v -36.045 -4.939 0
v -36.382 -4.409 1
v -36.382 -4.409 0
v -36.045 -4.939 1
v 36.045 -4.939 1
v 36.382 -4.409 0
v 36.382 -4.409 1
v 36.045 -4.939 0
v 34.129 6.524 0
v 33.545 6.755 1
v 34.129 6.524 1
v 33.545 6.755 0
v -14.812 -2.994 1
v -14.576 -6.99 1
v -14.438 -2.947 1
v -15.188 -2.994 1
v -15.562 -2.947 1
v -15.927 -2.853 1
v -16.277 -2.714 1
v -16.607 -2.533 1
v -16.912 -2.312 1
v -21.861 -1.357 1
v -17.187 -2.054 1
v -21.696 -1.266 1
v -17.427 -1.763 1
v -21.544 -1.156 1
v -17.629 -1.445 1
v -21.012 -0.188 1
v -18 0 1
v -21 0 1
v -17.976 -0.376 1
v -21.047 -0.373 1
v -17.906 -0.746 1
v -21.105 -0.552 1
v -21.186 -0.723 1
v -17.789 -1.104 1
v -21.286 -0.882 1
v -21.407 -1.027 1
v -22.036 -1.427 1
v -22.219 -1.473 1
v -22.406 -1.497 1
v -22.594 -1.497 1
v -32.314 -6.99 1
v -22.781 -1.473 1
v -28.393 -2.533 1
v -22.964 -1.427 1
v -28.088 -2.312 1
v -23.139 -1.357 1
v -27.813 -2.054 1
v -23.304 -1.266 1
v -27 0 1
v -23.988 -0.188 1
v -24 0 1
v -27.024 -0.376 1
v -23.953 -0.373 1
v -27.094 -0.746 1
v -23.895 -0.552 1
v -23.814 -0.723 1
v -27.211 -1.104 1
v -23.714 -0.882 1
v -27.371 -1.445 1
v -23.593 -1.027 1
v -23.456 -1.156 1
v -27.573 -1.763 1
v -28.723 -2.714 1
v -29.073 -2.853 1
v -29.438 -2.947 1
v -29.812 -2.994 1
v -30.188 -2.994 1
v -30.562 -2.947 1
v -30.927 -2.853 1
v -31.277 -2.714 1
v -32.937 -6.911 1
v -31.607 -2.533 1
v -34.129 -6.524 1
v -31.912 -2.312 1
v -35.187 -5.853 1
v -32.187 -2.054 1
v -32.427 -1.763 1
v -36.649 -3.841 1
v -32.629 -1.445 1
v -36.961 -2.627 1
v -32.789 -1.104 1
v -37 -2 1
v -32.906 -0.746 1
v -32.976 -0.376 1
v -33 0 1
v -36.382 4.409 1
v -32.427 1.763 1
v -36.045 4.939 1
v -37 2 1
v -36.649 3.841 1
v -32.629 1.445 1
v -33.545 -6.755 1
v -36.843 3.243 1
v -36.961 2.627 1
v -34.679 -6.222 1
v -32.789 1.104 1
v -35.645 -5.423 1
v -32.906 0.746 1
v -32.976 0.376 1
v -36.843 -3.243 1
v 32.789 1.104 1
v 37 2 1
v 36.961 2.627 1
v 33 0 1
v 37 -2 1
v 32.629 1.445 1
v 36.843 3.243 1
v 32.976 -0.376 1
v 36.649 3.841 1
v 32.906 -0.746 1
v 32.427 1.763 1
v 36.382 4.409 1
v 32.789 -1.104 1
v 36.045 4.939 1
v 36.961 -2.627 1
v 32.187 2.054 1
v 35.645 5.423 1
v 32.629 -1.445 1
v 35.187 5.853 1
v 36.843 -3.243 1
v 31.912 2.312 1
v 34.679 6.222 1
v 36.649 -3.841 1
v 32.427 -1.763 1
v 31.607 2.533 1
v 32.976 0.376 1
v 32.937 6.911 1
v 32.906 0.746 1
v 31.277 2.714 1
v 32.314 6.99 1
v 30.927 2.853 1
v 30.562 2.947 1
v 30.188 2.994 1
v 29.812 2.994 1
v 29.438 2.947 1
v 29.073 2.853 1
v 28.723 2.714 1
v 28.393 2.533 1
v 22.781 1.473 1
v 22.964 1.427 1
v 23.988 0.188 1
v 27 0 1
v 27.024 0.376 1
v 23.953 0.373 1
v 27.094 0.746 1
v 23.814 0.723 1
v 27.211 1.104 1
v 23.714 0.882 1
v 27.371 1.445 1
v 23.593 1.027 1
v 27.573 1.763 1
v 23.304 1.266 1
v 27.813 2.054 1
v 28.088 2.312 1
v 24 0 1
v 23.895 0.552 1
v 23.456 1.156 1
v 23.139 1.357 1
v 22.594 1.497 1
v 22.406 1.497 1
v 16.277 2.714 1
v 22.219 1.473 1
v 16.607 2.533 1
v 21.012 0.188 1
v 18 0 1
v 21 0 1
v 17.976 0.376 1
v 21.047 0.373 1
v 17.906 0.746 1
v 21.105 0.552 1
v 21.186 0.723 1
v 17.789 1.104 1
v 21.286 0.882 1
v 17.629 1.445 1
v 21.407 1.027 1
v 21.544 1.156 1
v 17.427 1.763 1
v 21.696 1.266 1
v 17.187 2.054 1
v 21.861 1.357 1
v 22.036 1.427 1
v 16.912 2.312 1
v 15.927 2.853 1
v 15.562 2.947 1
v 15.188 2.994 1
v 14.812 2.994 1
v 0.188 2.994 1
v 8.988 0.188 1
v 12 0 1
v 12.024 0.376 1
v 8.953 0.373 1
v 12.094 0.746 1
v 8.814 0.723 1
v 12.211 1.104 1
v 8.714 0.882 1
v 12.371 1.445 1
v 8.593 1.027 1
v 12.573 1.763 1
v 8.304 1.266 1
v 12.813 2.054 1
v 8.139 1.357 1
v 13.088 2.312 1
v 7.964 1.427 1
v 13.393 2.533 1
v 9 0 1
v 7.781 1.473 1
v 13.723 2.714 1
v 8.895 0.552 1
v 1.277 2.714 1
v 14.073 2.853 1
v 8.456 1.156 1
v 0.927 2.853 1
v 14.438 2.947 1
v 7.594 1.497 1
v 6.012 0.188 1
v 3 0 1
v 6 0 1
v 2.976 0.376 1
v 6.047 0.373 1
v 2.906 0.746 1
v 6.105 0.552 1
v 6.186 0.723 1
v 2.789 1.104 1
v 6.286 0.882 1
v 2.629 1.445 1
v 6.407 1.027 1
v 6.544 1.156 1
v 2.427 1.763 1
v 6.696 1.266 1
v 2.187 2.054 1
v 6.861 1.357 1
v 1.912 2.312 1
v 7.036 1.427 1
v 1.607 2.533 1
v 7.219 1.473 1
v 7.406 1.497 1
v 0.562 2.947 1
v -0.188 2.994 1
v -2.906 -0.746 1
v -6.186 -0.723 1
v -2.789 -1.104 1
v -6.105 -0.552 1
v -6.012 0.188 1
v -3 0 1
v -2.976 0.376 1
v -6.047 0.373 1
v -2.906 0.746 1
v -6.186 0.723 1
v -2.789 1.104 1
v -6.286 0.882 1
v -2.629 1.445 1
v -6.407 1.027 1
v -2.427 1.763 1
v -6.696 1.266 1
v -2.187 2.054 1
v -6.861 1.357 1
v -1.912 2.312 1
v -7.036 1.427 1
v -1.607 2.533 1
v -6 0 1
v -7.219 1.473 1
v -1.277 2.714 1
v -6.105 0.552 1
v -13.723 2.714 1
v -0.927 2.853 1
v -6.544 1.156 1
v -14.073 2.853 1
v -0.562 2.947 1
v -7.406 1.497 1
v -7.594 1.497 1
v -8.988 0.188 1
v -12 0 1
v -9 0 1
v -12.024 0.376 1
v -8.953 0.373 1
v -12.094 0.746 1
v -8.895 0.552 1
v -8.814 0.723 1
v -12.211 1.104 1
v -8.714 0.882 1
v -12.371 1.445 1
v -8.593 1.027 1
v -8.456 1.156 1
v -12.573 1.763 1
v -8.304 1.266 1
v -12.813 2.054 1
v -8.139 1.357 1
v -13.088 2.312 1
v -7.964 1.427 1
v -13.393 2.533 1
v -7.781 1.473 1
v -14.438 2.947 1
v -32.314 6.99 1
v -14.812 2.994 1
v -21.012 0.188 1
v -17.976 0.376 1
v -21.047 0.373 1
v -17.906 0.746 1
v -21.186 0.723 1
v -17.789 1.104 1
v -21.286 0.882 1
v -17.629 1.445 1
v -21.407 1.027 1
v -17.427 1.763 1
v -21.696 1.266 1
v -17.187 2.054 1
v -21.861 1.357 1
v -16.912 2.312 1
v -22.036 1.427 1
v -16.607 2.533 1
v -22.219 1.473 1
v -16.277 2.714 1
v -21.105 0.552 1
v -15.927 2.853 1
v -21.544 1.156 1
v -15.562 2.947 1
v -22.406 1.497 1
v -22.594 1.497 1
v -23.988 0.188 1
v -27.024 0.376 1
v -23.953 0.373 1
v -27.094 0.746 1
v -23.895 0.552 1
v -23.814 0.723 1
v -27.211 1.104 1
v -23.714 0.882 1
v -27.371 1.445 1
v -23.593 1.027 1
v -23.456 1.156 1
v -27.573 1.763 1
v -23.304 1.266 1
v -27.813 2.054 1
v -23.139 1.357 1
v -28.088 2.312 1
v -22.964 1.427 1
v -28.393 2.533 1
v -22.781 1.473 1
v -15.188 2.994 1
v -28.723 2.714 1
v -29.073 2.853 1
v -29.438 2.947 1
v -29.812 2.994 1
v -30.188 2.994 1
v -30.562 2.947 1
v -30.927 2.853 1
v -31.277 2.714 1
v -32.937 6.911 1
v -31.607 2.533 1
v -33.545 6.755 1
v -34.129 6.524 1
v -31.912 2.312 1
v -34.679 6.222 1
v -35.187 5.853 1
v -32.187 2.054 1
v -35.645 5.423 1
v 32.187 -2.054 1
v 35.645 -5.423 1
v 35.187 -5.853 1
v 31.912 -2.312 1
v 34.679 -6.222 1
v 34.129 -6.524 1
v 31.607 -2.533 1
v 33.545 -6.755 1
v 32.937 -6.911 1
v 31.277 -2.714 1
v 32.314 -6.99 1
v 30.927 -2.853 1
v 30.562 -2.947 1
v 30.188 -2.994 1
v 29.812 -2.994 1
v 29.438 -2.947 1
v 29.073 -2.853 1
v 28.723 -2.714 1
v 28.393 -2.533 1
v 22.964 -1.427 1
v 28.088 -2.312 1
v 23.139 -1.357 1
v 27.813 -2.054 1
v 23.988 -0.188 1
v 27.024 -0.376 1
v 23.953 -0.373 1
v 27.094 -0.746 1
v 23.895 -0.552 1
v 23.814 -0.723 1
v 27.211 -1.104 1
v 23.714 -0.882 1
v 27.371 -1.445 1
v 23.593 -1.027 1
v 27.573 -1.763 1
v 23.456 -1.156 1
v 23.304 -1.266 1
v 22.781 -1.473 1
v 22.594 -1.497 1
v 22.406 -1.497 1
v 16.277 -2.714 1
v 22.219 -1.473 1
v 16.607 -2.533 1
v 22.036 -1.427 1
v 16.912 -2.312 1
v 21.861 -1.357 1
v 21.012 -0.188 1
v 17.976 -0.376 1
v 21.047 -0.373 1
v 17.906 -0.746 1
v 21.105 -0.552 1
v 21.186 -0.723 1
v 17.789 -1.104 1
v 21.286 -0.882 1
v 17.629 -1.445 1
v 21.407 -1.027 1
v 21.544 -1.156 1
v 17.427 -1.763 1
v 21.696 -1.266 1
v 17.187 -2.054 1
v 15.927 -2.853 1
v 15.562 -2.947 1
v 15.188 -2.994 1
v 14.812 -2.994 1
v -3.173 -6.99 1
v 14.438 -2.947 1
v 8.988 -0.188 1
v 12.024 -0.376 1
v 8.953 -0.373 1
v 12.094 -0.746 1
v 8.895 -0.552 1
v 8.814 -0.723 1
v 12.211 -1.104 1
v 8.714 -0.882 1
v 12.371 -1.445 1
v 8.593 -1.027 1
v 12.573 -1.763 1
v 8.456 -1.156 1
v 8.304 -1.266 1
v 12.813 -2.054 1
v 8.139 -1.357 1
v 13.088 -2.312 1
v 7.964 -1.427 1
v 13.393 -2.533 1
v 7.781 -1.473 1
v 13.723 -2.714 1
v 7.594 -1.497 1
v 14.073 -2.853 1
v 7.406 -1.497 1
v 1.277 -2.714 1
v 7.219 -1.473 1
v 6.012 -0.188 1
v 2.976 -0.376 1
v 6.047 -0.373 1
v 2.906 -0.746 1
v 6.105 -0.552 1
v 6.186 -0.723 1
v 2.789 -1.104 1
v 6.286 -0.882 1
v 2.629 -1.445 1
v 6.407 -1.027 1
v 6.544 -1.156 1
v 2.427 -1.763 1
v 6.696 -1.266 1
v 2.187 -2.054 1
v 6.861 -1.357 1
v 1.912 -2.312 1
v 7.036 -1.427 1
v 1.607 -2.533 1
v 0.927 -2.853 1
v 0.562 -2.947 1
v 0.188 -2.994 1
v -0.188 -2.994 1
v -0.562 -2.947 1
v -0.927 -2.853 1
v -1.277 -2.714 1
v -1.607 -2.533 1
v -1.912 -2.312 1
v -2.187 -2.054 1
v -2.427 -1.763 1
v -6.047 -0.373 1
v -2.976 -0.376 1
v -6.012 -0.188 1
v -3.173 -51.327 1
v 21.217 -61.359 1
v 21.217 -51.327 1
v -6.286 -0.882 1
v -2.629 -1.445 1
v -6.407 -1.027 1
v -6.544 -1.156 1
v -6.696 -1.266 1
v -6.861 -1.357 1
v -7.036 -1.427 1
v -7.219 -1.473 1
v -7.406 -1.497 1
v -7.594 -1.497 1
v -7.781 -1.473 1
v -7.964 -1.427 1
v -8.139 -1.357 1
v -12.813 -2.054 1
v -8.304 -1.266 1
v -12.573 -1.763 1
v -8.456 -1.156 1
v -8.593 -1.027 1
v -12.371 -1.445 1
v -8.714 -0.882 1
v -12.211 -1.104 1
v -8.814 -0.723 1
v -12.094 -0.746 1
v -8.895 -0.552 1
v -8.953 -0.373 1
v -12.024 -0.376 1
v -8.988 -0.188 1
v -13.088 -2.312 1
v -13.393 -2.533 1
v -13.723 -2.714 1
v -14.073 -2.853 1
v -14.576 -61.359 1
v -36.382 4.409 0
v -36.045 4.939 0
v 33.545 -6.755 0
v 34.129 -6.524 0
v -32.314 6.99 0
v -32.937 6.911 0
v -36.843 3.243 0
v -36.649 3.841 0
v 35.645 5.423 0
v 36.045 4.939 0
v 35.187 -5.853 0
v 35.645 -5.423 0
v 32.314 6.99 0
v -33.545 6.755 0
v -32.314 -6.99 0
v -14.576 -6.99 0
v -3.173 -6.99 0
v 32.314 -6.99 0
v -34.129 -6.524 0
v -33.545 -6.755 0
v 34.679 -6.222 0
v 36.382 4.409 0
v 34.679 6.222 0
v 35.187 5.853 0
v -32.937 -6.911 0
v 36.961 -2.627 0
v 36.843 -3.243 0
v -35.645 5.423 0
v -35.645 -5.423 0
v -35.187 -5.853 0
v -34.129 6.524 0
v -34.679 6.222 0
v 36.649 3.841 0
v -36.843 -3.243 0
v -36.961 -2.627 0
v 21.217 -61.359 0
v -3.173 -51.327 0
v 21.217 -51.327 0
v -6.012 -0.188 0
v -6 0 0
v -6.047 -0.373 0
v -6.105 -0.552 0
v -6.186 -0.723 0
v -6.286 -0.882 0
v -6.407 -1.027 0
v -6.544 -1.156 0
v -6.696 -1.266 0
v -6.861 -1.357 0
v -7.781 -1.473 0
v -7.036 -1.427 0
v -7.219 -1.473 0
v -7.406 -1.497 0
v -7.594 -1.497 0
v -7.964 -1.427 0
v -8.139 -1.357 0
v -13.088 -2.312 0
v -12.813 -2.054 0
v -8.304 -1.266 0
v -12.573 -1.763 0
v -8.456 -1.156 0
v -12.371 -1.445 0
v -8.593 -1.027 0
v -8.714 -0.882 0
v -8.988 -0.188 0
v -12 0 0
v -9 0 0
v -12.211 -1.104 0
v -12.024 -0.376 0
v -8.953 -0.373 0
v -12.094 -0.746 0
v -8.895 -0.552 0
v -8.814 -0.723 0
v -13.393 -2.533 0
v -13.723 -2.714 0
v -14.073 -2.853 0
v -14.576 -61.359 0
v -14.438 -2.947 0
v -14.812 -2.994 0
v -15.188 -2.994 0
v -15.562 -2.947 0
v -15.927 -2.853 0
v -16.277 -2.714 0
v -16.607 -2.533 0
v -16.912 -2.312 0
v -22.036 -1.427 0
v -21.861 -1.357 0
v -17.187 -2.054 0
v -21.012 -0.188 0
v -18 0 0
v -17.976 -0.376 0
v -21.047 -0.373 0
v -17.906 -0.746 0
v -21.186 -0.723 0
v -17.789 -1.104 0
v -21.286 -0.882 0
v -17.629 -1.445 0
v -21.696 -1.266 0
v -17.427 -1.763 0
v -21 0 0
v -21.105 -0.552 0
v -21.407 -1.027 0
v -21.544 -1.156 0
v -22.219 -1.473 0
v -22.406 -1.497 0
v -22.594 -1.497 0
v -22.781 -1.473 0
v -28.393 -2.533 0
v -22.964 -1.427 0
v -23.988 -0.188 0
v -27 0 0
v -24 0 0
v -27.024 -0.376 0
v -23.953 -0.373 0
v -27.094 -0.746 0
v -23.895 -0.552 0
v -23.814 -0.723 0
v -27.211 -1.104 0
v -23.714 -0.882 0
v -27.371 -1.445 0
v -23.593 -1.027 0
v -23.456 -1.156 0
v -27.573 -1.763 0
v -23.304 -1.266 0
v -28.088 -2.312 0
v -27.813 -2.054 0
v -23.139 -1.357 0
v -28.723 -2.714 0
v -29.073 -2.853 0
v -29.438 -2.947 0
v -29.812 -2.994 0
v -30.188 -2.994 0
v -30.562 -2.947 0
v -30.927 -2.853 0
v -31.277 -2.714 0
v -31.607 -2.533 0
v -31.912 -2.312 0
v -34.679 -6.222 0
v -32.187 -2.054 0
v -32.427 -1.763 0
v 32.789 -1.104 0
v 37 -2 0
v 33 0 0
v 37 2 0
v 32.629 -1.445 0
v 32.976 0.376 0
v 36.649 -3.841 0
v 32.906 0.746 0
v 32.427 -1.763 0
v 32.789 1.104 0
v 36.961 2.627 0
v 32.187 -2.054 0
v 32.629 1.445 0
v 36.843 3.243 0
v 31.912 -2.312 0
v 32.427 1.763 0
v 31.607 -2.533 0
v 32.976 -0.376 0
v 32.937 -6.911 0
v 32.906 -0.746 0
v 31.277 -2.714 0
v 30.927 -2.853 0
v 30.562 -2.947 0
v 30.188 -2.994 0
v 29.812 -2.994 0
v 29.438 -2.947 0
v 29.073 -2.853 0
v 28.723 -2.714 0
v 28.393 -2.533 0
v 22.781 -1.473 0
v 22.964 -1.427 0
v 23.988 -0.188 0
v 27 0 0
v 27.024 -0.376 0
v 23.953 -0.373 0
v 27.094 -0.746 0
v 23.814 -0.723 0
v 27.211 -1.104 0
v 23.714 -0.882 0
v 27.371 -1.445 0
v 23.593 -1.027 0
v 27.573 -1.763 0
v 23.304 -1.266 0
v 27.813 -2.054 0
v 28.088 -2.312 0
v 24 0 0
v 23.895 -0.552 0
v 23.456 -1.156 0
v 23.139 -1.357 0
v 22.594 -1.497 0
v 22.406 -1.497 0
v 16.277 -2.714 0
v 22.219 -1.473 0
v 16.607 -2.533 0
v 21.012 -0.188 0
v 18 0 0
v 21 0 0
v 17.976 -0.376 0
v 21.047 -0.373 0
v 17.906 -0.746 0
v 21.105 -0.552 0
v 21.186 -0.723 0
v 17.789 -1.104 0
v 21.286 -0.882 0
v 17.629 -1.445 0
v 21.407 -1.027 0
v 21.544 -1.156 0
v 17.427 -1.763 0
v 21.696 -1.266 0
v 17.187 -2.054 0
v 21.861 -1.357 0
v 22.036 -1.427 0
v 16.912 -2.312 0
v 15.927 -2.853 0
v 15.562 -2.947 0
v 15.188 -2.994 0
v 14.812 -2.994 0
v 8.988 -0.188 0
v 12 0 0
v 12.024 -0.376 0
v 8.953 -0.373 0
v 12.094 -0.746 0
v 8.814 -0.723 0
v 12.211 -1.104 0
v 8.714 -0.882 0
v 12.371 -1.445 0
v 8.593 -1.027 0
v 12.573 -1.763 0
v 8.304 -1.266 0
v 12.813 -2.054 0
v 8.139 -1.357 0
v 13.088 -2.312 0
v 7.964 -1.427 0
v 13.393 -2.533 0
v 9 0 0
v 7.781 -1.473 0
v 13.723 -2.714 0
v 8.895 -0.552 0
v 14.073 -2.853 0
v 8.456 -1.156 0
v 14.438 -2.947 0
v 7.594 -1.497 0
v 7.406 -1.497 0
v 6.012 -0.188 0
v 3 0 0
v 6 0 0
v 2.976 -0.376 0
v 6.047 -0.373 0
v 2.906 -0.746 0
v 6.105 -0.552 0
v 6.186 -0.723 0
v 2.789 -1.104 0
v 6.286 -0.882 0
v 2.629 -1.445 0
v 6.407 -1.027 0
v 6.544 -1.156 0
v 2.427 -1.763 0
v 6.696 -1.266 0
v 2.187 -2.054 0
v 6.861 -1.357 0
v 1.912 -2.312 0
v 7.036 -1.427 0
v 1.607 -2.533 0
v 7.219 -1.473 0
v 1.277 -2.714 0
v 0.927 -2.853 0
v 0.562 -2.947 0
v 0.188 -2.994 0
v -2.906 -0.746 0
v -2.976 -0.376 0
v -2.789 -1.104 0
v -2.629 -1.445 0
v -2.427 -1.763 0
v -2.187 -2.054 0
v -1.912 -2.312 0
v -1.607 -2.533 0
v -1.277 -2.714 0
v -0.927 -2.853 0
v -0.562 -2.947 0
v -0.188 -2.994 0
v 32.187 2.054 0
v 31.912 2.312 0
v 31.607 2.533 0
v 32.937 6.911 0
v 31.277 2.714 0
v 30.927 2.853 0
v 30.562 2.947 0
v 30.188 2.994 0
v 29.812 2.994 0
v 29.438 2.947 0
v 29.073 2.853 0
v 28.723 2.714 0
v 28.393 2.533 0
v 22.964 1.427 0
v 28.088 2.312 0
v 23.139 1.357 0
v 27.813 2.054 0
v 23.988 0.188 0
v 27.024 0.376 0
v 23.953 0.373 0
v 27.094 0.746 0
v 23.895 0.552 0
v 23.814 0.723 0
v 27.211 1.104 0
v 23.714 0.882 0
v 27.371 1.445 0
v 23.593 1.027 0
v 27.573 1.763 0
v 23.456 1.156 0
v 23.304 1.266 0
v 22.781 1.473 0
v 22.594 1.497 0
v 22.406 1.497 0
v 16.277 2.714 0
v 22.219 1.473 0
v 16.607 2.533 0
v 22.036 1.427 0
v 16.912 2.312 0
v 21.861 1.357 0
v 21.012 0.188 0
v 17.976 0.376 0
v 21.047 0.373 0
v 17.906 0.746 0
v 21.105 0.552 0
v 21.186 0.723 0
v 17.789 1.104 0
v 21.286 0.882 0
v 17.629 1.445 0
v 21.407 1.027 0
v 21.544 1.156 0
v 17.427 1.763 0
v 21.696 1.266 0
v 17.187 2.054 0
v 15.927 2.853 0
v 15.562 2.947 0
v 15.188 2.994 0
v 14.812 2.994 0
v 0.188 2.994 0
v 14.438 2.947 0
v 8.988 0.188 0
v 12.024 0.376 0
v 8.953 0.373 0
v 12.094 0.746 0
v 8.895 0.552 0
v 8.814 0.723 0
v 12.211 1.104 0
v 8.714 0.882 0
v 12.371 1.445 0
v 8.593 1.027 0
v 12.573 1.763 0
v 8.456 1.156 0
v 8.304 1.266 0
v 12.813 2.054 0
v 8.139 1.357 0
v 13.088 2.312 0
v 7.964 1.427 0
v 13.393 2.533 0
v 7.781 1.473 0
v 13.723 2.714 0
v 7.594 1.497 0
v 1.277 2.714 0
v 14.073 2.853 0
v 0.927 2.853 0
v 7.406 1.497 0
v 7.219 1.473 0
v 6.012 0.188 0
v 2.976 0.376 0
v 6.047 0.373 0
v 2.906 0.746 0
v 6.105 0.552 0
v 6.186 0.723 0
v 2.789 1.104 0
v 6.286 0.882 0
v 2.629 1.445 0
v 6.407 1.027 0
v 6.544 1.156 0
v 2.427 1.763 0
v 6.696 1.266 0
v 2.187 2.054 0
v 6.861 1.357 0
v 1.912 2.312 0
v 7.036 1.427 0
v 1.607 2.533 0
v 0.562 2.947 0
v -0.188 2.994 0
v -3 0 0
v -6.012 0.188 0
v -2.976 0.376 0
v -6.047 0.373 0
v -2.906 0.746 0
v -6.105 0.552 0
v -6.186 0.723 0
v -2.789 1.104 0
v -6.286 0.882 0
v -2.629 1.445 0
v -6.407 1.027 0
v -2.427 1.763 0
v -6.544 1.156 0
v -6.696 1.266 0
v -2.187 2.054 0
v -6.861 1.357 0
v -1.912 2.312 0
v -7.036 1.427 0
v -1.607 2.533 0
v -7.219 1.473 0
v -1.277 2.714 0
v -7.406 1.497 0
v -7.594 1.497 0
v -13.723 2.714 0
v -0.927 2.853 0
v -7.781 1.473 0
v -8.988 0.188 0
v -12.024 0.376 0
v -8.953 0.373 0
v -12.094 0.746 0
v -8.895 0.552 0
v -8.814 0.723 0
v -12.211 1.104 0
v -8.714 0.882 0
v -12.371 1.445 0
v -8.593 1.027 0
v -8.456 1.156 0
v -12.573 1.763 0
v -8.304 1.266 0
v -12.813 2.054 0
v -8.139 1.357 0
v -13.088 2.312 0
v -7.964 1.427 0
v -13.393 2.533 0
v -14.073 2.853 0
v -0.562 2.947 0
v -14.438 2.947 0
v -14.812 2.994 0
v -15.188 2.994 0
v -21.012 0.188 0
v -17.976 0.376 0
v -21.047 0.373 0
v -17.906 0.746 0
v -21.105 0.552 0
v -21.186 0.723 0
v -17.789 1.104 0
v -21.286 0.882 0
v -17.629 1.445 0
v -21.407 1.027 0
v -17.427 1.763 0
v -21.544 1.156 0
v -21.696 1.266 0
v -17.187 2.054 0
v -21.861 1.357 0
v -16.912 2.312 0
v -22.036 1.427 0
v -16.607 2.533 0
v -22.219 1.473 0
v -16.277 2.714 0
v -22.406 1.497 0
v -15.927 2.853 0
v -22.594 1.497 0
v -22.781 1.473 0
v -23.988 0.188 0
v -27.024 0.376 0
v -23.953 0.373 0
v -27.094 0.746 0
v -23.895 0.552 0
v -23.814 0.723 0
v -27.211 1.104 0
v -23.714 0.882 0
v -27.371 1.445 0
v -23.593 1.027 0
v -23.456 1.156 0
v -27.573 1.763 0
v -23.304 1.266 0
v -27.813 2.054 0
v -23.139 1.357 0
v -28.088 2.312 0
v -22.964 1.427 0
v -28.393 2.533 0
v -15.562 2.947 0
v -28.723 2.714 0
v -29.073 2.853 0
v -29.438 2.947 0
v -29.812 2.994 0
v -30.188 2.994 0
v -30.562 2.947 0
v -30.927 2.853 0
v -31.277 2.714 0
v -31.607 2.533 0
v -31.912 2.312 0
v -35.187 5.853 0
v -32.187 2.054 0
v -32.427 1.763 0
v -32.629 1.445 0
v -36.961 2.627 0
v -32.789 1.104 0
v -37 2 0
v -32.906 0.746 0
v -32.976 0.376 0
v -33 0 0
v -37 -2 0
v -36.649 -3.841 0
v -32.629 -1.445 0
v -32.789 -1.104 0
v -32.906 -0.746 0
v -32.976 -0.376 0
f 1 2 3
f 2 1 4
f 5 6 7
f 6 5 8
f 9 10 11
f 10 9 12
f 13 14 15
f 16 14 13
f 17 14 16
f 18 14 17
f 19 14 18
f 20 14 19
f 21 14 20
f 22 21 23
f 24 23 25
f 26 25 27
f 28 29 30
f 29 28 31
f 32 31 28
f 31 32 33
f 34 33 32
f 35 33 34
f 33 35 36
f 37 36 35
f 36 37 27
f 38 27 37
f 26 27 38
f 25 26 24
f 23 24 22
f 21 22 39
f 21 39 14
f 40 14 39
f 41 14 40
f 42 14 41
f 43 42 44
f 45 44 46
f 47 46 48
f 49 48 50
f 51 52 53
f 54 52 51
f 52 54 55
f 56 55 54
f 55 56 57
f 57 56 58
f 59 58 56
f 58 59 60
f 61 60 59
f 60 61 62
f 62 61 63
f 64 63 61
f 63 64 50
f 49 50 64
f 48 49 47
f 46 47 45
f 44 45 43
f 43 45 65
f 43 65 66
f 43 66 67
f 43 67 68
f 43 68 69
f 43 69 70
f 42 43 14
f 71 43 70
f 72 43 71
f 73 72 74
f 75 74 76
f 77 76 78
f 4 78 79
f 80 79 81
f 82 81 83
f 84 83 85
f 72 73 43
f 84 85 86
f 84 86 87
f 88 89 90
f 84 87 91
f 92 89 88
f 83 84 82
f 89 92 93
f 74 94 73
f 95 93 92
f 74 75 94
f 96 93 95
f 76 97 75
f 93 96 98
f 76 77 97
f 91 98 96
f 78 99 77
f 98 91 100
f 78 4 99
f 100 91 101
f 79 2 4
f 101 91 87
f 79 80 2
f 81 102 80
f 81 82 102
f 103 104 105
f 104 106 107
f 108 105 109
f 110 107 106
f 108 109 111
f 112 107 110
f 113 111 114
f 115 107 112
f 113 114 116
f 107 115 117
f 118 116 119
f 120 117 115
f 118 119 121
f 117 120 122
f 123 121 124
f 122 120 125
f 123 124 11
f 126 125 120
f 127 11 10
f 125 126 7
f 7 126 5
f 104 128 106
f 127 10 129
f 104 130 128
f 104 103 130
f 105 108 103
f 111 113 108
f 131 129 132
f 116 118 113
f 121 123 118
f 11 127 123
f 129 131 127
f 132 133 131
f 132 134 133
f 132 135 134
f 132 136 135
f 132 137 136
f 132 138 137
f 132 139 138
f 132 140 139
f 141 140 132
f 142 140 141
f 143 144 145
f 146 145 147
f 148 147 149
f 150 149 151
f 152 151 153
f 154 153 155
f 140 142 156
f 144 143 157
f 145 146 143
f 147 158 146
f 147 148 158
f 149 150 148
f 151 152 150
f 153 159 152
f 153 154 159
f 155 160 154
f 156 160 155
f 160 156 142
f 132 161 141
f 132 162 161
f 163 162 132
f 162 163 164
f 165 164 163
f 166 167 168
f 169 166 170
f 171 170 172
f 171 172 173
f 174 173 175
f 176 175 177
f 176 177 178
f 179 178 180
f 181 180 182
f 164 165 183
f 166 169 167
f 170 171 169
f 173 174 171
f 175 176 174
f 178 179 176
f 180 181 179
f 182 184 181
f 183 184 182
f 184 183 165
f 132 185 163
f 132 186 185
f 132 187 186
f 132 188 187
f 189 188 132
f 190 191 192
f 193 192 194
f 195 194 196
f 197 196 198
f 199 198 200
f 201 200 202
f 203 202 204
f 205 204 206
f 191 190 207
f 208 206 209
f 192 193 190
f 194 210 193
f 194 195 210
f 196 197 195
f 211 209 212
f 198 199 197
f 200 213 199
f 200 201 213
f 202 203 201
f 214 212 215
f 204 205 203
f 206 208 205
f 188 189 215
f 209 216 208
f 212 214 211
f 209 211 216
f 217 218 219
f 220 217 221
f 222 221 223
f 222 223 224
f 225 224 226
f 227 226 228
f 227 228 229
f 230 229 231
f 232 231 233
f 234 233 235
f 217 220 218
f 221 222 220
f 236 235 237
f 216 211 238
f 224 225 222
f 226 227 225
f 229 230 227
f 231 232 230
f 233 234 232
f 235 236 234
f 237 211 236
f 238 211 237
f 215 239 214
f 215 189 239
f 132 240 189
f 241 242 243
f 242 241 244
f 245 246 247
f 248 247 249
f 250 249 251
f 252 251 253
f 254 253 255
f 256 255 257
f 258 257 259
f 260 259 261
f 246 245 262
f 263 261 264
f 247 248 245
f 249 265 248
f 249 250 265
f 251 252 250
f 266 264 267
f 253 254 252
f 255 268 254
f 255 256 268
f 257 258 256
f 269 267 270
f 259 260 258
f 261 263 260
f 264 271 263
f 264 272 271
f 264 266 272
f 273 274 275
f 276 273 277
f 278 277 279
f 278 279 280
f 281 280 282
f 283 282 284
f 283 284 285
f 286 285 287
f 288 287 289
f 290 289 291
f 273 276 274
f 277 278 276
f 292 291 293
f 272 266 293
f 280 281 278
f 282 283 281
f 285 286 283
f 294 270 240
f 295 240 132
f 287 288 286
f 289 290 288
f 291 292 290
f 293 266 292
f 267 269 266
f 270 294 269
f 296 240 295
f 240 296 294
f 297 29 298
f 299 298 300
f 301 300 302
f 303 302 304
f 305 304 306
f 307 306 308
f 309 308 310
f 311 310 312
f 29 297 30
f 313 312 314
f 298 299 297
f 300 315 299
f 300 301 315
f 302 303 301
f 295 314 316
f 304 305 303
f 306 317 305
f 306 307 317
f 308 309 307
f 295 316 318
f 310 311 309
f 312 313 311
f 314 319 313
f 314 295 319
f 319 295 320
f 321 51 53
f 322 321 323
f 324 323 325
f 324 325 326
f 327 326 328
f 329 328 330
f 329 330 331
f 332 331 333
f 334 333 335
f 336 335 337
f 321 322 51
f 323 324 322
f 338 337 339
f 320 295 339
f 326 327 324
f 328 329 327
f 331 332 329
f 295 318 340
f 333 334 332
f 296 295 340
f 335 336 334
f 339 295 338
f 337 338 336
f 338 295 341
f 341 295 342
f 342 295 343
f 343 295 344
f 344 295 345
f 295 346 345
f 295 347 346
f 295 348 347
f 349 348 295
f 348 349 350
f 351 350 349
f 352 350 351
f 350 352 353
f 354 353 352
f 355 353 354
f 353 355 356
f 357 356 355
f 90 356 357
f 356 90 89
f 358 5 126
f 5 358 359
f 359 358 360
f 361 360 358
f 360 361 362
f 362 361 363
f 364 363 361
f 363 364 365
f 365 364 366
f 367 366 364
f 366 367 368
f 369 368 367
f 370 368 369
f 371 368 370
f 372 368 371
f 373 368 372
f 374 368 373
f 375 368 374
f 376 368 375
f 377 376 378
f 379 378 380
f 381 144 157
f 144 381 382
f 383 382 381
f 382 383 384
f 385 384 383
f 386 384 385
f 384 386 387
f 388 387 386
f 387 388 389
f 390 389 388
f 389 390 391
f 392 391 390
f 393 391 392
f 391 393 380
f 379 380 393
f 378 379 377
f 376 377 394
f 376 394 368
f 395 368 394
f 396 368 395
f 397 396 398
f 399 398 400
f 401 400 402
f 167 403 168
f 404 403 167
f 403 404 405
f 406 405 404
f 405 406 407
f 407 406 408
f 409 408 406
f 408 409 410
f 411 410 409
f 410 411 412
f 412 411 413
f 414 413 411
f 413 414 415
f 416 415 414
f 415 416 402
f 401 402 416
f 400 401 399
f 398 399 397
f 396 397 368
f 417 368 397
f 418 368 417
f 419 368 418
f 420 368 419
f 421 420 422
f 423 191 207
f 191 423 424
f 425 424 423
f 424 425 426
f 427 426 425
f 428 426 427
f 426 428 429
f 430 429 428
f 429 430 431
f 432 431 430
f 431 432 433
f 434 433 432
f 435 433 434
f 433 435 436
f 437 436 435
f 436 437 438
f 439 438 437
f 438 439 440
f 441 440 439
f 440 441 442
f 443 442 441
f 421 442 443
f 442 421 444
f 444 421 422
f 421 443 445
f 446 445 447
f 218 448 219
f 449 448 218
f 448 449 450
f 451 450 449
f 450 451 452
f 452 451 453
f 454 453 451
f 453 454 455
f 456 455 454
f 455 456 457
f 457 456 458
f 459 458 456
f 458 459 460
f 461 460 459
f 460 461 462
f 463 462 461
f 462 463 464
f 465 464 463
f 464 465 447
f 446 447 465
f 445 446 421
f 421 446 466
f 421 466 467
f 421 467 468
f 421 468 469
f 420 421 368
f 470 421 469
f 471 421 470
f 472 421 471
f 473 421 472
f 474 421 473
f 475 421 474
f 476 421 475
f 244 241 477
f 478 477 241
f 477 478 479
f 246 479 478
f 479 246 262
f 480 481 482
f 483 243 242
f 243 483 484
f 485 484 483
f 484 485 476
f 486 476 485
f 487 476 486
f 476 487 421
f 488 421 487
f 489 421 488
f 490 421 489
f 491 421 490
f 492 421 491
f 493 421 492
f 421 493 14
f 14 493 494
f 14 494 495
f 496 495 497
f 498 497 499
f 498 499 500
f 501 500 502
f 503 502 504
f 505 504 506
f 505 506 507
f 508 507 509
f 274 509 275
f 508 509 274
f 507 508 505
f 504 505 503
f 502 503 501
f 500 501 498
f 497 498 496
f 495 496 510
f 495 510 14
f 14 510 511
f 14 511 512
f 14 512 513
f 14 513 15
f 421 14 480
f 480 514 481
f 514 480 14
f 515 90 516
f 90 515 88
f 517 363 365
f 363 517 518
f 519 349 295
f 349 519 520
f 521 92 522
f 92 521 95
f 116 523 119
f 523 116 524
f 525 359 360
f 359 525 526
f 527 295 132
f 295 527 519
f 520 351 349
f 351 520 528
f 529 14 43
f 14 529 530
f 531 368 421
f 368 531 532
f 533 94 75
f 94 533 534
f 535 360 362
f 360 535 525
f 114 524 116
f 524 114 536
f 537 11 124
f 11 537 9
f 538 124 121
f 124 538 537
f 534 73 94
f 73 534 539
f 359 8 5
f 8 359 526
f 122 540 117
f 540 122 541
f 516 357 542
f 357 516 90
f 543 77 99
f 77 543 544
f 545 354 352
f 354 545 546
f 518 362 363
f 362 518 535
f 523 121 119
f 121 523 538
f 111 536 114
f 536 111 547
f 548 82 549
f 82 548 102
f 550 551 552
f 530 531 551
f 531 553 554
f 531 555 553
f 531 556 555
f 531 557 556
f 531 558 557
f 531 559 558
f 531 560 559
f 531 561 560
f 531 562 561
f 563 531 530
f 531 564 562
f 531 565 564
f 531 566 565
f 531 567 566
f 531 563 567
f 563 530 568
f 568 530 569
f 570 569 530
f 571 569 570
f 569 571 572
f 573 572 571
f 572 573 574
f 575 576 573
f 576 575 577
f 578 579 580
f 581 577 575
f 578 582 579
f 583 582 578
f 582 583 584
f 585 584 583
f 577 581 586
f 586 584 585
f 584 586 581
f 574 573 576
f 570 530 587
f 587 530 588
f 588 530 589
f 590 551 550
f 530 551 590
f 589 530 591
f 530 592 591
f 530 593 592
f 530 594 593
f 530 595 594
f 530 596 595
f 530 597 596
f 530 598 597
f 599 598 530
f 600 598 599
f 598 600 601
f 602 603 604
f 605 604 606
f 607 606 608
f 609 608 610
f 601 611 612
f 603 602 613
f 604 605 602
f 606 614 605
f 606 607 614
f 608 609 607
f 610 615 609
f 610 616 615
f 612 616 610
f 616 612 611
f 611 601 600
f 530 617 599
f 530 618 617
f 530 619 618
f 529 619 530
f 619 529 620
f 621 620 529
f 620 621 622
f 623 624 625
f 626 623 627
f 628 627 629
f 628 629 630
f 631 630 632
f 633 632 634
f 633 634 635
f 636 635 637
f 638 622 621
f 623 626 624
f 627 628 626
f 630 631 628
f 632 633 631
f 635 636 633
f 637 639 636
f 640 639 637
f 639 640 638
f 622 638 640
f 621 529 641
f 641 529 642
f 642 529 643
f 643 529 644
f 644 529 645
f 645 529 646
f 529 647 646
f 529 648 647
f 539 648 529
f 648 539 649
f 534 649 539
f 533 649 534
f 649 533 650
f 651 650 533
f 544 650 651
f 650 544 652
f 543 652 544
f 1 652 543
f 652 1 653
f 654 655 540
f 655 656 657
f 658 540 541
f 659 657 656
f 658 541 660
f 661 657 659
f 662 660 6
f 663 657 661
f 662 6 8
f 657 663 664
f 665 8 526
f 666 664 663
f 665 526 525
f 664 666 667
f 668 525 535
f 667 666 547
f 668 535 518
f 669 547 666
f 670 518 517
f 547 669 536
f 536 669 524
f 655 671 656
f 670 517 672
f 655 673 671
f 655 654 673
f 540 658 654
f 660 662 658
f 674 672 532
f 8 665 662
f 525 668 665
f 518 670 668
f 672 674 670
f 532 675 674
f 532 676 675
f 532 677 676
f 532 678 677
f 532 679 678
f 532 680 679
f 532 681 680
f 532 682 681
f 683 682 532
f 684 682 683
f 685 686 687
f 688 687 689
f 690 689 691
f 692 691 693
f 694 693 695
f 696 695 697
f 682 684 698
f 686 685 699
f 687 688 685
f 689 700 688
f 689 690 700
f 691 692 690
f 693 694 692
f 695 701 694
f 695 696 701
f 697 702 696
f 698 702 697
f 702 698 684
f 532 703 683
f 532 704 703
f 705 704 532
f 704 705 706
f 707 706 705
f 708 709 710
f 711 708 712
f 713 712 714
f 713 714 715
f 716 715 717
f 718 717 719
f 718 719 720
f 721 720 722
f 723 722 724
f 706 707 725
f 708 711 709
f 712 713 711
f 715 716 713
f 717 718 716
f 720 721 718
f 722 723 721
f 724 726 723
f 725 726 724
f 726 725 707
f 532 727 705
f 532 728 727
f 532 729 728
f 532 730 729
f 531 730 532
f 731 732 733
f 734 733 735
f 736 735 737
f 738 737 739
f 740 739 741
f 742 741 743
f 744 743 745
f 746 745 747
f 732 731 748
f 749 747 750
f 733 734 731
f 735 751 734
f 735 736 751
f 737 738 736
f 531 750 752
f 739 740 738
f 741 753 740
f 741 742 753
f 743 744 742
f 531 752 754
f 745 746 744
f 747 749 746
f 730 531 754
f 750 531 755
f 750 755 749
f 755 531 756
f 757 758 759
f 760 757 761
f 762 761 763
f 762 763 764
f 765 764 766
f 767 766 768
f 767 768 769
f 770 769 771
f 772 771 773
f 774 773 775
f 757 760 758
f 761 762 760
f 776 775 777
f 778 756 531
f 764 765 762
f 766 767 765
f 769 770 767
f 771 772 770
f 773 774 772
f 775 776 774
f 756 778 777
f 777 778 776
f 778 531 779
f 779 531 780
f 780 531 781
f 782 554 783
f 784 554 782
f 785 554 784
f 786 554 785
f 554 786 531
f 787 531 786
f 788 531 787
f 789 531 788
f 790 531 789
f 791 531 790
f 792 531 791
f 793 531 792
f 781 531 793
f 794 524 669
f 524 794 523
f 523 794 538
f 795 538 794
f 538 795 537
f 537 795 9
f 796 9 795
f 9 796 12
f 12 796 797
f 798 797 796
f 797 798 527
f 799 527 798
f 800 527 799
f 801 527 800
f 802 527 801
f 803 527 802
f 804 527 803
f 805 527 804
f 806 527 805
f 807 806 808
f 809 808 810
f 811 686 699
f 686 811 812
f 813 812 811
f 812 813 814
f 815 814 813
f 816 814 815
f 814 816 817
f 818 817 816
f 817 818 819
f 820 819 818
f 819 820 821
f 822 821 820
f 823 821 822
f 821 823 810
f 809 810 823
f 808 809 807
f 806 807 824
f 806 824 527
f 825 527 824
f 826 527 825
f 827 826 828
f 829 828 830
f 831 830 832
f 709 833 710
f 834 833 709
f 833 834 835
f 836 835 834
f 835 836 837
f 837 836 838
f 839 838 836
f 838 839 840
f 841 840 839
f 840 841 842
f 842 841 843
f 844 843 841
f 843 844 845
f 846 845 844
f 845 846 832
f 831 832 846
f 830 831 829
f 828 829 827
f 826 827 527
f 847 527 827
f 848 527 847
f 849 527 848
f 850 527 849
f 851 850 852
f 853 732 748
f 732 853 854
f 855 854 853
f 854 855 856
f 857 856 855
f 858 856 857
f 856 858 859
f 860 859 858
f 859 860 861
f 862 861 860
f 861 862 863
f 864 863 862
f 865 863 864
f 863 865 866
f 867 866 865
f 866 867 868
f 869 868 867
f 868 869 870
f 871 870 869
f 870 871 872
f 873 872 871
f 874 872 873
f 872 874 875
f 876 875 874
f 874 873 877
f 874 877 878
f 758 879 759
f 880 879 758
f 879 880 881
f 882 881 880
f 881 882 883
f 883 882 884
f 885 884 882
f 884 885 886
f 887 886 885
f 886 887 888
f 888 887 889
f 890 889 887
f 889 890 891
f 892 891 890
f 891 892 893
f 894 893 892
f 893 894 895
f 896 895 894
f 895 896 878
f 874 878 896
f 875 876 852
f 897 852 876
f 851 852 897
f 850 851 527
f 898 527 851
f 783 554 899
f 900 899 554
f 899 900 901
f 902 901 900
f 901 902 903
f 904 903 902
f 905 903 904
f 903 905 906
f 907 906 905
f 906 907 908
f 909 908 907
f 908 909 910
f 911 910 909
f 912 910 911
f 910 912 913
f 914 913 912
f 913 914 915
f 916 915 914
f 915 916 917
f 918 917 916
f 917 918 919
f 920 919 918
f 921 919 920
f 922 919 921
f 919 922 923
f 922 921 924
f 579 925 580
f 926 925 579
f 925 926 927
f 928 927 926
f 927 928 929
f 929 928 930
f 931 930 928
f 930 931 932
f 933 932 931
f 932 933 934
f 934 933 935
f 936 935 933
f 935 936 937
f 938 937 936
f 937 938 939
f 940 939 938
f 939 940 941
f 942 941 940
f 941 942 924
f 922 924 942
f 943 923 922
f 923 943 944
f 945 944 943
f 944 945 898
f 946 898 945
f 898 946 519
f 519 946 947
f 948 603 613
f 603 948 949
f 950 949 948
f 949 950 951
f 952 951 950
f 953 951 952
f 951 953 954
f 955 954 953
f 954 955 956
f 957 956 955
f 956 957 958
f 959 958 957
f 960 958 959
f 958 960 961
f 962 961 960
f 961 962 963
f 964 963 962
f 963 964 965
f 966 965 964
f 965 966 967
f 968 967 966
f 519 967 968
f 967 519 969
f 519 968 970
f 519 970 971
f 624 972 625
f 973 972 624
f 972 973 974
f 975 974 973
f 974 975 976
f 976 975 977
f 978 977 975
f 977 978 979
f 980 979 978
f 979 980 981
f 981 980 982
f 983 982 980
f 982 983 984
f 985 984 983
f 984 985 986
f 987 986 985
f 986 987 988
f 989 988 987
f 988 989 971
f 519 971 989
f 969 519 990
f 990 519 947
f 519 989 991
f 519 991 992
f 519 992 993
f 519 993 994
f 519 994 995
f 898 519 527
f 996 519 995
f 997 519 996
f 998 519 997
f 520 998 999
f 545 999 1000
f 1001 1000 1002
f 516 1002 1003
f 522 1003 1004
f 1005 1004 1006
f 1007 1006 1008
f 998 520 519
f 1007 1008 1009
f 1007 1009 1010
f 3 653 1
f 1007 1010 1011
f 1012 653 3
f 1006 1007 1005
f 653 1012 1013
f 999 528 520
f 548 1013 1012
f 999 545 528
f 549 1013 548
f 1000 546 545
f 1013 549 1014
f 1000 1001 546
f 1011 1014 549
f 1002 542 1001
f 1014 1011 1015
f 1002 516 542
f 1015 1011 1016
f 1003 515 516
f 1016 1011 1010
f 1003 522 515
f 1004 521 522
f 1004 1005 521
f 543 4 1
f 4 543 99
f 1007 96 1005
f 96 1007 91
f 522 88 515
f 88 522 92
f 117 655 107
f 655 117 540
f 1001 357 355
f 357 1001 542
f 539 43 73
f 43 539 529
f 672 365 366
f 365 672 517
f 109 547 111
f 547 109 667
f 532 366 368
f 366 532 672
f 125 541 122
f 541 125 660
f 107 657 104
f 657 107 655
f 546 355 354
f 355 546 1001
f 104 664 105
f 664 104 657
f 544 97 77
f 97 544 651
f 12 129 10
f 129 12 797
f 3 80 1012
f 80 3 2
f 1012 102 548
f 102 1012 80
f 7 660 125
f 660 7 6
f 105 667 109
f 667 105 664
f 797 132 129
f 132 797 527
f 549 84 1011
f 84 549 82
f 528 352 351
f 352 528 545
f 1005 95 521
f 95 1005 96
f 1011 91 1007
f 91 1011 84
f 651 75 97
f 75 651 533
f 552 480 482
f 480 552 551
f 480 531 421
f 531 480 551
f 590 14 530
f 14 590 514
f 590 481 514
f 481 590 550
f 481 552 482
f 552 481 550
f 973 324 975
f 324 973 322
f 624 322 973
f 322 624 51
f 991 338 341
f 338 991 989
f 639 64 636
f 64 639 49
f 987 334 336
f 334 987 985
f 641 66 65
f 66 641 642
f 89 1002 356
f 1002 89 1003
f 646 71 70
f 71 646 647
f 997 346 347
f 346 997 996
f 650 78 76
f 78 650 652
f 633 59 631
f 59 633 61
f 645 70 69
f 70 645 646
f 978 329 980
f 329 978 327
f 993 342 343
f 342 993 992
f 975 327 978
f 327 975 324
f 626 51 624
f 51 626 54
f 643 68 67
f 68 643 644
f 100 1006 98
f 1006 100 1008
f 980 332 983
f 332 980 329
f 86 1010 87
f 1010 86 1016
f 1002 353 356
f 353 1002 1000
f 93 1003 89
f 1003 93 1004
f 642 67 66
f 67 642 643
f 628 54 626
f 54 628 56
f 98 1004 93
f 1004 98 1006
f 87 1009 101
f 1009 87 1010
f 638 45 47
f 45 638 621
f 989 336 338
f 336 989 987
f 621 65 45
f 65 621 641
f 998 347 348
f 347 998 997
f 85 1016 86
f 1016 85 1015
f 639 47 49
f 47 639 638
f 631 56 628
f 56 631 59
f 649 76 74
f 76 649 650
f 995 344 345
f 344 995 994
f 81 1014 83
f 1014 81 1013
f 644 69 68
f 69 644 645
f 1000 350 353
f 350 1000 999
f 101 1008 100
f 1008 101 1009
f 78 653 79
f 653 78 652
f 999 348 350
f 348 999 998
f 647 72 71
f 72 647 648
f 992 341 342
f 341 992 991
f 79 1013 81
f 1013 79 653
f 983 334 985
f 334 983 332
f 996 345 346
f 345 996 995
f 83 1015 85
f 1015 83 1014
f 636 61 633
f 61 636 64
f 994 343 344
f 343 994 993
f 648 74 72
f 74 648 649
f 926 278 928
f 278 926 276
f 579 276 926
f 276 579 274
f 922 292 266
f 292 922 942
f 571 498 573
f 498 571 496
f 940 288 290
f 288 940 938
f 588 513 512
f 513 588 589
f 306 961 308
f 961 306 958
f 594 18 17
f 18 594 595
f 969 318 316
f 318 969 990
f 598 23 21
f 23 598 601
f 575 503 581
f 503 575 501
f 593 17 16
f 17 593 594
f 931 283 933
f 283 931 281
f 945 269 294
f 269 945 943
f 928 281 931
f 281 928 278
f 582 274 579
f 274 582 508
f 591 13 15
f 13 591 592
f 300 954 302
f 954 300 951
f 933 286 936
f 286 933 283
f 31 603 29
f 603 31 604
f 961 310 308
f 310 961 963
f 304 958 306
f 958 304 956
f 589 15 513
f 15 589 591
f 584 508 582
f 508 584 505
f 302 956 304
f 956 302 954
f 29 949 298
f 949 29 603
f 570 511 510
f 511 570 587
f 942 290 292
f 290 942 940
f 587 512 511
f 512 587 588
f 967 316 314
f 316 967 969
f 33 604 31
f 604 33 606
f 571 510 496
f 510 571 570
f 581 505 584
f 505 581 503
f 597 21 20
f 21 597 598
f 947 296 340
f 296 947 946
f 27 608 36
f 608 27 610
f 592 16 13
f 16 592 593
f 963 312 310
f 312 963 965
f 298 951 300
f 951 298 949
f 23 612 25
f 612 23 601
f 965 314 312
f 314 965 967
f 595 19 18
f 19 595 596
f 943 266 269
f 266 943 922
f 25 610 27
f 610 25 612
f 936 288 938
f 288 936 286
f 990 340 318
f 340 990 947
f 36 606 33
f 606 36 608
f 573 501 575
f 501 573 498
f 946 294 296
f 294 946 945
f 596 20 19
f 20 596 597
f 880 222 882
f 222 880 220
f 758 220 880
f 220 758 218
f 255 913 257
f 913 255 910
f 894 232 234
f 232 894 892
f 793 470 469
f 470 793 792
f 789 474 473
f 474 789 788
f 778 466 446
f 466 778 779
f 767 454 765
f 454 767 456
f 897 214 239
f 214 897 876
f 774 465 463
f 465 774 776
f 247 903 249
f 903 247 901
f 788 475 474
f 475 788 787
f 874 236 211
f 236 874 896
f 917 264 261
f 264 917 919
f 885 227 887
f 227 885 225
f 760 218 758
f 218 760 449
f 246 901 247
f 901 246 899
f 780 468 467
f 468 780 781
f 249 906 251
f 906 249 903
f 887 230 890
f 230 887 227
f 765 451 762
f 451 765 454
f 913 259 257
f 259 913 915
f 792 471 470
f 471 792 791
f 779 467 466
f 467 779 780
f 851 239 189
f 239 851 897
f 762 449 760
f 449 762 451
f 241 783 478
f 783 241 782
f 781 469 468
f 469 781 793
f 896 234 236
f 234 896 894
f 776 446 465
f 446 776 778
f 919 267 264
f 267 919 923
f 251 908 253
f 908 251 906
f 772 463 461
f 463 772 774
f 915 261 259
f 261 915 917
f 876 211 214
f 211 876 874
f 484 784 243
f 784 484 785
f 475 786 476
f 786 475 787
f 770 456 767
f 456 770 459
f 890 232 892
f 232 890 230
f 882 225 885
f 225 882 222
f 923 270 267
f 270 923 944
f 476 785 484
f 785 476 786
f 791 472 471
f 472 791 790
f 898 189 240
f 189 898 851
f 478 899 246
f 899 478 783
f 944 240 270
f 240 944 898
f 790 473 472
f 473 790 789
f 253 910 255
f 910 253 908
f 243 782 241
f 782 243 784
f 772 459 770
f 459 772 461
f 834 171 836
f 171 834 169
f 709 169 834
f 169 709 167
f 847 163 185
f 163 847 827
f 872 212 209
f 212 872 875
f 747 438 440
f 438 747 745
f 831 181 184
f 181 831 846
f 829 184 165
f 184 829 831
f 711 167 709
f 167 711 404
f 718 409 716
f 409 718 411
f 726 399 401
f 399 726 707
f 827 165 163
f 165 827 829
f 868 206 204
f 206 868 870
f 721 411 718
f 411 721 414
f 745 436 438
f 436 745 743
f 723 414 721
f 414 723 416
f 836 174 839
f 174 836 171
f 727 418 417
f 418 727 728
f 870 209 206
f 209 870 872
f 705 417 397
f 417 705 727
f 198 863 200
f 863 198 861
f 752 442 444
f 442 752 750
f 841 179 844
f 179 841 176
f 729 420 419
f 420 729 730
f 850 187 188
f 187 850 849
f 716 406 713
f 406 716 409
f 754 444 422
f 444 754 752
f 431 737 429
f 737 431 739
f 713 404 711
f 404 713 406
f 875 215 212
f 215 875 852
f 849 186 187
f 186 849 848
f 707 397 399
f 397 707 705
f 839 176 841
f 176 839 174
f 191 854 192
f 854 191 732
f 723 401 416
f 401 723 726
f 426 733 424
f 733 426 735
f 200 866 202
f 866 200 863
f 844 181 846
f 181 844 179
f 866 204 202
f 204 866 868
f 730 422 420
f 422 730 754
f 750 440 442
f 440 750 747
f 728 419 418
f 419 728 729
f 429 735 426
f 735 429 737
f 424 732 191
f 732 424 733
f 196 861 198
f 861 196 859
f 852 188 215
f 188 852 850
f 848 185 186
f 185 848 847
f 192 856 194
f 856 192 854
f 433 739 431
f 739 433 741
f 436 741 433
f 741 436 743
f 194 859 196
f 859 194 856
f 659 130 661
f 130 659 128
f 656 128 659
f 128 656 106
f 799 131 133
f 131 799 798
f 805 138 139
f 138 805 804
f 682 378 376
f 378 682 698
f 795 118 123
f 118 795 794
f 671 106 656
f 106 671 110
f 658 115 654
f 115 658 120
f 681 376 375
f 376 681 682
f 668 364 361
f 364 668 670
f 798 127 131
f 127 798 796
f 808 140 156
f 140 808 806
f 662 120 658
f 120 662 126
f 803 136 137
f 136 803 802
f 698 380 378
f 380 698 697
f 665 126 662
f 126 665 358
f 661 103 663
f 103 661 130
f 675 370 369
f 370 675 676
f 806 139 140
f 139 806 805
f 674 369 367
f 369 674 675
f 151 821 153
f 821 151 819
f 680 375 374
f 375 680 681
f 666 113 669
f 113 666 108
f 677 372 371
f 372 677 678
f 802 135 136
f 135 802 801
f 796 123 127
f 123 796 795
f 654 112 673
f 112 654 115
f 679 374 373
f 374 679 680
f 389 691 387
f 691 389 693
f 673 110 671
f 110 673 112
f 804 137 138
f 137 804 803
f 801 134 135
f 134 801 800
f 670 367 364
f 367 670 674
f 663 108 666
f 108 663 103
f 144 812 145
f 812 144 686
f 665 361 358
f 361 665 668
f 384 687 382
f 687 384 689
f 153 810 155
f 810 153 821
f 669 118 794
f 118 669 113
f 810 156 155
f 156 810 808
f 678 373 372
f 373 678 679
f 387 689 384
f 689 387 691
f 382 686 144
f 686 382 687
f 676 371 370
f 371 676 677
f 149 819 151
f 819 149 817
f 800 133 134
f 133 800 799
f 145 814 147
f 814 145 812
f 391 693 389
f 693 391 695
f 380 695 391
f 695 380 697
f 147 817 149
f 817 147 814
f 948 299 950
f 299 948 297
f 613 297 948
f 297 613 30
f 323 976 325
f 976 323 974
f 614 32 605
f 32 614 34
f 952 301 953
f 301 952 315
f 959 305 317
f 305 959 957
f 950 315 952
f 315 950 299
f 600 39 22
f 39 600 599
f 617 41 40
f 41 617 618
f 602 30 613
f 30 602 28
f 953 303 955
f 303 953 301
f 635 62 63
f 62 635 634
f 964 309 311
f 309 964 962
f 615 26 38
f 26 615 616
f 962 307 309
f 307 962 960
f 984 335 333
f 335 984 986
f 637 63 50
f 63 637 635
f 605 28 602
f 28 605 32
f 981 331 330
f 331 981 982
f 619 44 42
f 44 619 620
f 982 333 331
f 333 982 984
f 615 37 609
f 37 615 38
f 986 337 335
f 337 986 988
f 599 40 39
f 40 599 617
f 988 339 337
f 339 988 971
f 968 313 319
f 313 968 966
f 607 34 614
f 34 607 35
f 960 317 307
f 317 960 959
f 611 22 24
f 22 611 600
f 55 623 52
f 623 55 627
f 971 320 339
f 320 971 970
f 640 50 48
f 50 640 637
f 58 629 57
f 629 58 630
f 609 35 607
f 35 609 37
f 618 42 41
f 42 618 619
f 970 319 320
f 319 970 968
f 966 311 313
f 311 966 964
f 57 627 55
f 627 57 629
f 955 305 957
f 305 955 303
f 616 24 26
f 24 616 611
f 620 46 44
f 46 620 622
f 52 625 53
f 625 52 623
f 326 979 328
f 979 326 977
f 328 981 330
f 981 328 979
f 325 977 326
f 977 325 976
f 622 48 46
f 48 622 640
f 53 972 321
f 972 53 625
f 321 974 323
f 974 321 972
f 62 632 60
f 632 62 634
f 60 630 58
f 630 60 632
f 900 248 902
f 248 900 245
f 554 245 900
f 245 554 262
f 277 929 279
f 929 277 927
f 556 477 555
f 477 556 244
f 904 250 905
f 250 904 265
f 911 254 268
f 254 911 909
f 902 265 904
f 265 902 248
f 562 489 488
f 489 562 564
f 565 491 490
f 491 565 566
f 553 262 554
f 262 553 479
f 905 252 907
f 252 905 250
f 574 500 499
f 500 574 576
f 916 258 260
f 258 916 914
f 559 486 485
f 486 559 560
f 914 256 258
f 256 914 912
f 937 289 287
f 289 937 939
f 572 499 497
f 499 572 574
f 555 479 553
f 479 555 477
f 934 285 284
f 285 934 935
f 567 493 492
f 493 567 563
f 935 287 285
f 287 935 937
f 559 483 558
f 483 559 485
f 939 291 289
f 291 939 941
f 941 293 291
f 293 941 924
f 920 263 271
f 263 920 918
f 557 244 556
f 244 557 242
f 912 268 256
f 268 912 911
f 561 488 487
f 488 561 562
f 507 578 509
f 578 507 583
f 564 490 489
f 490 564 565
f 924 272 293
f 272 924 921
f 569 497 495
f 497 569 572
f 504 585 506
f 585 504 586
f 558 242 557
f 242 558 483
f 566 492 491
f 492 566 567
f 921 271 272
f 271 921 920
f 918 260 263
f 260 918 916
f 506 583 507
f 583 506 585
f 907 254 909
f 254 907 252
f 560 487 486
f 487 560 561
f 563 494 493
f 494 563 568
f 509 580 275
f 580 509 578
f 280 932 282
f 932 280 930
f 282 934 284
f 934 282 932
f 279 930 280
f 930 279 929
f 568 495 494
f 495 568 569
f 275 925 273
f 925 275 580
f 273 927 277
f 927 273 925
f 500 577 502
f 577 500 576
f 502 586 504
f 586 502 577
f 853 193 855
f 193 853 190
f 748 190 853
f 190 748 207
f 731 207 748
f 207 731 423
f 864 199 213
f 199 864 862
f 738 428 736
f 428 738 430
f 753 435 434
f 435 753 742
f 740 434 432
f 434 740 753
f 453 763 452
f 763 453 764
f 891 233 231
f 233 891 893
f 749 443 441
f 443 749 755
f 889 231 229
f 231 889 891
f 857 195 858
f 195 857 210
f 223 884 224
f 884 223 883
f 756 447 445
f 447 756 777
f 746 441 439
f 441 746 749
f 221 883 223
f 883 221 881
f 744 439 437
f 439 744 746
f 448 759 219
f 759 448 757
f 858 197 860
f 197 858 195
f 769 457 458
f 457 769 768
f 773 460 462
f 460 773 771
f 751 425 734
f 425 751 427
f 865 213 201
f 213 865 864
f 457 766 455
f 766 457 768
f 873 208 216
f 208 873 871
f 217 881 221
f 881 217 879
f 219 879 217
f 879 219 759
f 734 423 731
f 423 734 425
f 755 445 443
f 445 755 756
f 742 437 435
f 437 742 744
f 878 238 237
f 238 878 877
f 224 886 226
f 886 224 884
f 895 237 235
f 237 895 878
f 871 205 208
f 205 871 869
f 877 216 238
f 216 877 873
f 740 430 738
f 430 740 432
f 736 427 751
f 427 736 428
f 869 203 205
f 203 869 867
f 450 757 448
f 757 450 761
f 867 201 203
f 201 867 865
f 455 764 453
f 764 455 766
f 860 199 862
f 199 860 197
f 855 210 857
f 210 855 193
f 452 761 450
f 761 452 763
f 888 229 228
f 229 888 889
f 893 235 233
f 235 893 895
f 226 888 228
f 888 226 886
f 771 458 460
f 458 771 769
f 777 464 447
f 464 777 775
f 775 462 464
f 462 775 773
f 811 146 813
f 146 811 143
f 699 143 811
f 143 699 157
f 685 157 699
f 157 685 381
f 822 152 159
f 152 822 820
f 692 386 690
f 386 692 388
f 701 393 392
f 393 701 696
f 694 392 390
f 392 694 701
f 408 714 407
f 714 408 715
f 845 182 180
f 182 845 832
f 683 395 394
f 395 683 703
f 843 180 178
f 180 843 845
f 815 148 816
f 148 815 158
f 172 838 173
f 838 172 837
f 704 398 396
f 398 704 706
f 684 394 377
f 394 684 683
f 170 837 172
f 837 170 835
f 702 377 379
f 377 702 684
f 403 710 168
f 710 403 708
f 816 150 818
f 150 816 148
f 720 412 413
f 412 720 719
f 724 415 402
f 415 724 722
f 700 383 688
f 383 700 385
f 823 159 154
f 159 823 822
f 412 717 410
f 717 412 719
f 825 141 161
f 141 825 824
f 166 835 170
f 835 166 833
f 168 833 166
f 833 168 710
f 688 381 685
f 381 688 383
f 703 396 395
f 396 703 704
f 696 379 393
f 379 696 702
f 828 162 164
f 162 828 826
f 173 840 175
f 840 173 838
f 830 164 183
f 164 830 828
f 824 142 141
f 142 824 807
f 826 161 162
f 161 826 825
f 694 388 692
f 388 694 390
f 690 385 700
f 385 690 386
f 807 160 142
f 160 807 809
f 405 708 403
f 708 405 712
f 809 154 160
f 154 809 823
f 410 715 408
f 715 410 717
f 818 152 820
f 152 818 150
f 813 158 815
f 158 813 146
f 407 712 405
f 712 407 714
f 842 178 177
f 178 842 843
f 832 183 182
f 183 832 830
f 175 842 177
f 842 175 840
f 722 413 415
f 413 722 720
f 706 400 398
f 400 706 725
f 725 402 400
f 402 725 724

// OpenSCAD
$fn = 50;


difference() {
	union() {
		hull() {
			translate(v = [-32.0000000000, 2.0000000000, 0]) {
				cylinder(h = 1, r = 5);
			}
			translate(v = [32.0000000000, 2.0000000000, 0]) {
				cylinder(h = 1, r = 5);
			}
			translate(v = [-32.0000000000, -2.0000000000, 0]) {
				cylinder(h = 1, r = 5);
			}
			translate(v = [32.0000000000, -2.0000000000, 0]) {
				cylinder(h = 1, r = 5);
			}
		}
		translate(v = [0, -5, 0]) {
			linear_extrude(height = 1) {
				text(font = "DejaVu Sans Mono:style=Bold", halign = "center", size = 57.0000000000, text = "L", valign = "top");
			}
		}
	}
	union() {
		translate(v = [-30.0000000000, 0.0000000000, 0]) {
			translate(v = [0, 0, -100]) {
				cylinder(h = 200, r = 3.0000000000);
			}
		}
		translate(v = [-15.0000000000, 0.0000000000, 0]) {
			translate(v = [0, 0, -100]) {
				cylinder(h = 200, r = 3.0000000000);
			}
		}
		translate(v = [0, 0, -100]) {
			cylinder(h = 200, r = 3.0000000000);
		}
		translate(v = [15.0000000000, 0.0000000000, 0]) {
			translate(v = [0, 0, -100]) {
				cylinder(h = 200, r = 3.0000000000);
			}
		}
		translate(v = [30.0000000000, 0.0000000000, 0]) {
			translate(v = [0, 0, -100]) {
				cylinder(h = 200, r = 3.0000000000);
			}
		}
		translate(v = [-30.0000000000, 0.0000000000, 0]) {
			translate(v = [0, 0, -100]) {
				cylinder(h = 200, r = 1.5000000000);
			}
		}
		translate(v = [-22.5000000000, 0.0000000000, 0]) {
			translate(v = [0, 0, -100]) {
				cylinder(h = 200, r = 1.5000000000);
			}
		}
		translate(v = [-15.0000000000, 0.0000000000, 0]) {
			translate(v = [0, 0, -100]) {
				cylinder(h = 200, r = 1.5000000000);
			}
		}
		translate(v = [-7.5000000000, 0.0000000000, 0]) {
			translate(v = [0, 0, -100]) {
				cylinder(h = 200, r = 1.5000000000);
			}
		}
		translate(v = [0, 0, -100]) {
			cylinder(h = 200, r = 1.5000000000);
		}
		translate(v = [7.5000000000, 0.0000000000, 0]) {
			translate(v = [0, 0, -100]) {
				cylinder(h = 200, r = 1.5000000000);
			}
		}
		translate(v = [15.0000000000, 0.0000000000, 0]) {
			translate(v = [0, 0, -100]) {
				cylinder(h = 200, r = 1.5000000000);
			}
		}
		translate(v = [22.5000000000, 0.0000000000, 0]) {
			translate(v = [0, 0, -100]) {
				cylinder(h = 200, r = 1.5000000000);
			}
		}
		translate(v = [30.0000000000, 0.0000000000, 0]) {
			translate(v = [0, 0, -100]) {
				cylinder(h = 200, r = 1.5000000000);
			}
		}
	}
}
